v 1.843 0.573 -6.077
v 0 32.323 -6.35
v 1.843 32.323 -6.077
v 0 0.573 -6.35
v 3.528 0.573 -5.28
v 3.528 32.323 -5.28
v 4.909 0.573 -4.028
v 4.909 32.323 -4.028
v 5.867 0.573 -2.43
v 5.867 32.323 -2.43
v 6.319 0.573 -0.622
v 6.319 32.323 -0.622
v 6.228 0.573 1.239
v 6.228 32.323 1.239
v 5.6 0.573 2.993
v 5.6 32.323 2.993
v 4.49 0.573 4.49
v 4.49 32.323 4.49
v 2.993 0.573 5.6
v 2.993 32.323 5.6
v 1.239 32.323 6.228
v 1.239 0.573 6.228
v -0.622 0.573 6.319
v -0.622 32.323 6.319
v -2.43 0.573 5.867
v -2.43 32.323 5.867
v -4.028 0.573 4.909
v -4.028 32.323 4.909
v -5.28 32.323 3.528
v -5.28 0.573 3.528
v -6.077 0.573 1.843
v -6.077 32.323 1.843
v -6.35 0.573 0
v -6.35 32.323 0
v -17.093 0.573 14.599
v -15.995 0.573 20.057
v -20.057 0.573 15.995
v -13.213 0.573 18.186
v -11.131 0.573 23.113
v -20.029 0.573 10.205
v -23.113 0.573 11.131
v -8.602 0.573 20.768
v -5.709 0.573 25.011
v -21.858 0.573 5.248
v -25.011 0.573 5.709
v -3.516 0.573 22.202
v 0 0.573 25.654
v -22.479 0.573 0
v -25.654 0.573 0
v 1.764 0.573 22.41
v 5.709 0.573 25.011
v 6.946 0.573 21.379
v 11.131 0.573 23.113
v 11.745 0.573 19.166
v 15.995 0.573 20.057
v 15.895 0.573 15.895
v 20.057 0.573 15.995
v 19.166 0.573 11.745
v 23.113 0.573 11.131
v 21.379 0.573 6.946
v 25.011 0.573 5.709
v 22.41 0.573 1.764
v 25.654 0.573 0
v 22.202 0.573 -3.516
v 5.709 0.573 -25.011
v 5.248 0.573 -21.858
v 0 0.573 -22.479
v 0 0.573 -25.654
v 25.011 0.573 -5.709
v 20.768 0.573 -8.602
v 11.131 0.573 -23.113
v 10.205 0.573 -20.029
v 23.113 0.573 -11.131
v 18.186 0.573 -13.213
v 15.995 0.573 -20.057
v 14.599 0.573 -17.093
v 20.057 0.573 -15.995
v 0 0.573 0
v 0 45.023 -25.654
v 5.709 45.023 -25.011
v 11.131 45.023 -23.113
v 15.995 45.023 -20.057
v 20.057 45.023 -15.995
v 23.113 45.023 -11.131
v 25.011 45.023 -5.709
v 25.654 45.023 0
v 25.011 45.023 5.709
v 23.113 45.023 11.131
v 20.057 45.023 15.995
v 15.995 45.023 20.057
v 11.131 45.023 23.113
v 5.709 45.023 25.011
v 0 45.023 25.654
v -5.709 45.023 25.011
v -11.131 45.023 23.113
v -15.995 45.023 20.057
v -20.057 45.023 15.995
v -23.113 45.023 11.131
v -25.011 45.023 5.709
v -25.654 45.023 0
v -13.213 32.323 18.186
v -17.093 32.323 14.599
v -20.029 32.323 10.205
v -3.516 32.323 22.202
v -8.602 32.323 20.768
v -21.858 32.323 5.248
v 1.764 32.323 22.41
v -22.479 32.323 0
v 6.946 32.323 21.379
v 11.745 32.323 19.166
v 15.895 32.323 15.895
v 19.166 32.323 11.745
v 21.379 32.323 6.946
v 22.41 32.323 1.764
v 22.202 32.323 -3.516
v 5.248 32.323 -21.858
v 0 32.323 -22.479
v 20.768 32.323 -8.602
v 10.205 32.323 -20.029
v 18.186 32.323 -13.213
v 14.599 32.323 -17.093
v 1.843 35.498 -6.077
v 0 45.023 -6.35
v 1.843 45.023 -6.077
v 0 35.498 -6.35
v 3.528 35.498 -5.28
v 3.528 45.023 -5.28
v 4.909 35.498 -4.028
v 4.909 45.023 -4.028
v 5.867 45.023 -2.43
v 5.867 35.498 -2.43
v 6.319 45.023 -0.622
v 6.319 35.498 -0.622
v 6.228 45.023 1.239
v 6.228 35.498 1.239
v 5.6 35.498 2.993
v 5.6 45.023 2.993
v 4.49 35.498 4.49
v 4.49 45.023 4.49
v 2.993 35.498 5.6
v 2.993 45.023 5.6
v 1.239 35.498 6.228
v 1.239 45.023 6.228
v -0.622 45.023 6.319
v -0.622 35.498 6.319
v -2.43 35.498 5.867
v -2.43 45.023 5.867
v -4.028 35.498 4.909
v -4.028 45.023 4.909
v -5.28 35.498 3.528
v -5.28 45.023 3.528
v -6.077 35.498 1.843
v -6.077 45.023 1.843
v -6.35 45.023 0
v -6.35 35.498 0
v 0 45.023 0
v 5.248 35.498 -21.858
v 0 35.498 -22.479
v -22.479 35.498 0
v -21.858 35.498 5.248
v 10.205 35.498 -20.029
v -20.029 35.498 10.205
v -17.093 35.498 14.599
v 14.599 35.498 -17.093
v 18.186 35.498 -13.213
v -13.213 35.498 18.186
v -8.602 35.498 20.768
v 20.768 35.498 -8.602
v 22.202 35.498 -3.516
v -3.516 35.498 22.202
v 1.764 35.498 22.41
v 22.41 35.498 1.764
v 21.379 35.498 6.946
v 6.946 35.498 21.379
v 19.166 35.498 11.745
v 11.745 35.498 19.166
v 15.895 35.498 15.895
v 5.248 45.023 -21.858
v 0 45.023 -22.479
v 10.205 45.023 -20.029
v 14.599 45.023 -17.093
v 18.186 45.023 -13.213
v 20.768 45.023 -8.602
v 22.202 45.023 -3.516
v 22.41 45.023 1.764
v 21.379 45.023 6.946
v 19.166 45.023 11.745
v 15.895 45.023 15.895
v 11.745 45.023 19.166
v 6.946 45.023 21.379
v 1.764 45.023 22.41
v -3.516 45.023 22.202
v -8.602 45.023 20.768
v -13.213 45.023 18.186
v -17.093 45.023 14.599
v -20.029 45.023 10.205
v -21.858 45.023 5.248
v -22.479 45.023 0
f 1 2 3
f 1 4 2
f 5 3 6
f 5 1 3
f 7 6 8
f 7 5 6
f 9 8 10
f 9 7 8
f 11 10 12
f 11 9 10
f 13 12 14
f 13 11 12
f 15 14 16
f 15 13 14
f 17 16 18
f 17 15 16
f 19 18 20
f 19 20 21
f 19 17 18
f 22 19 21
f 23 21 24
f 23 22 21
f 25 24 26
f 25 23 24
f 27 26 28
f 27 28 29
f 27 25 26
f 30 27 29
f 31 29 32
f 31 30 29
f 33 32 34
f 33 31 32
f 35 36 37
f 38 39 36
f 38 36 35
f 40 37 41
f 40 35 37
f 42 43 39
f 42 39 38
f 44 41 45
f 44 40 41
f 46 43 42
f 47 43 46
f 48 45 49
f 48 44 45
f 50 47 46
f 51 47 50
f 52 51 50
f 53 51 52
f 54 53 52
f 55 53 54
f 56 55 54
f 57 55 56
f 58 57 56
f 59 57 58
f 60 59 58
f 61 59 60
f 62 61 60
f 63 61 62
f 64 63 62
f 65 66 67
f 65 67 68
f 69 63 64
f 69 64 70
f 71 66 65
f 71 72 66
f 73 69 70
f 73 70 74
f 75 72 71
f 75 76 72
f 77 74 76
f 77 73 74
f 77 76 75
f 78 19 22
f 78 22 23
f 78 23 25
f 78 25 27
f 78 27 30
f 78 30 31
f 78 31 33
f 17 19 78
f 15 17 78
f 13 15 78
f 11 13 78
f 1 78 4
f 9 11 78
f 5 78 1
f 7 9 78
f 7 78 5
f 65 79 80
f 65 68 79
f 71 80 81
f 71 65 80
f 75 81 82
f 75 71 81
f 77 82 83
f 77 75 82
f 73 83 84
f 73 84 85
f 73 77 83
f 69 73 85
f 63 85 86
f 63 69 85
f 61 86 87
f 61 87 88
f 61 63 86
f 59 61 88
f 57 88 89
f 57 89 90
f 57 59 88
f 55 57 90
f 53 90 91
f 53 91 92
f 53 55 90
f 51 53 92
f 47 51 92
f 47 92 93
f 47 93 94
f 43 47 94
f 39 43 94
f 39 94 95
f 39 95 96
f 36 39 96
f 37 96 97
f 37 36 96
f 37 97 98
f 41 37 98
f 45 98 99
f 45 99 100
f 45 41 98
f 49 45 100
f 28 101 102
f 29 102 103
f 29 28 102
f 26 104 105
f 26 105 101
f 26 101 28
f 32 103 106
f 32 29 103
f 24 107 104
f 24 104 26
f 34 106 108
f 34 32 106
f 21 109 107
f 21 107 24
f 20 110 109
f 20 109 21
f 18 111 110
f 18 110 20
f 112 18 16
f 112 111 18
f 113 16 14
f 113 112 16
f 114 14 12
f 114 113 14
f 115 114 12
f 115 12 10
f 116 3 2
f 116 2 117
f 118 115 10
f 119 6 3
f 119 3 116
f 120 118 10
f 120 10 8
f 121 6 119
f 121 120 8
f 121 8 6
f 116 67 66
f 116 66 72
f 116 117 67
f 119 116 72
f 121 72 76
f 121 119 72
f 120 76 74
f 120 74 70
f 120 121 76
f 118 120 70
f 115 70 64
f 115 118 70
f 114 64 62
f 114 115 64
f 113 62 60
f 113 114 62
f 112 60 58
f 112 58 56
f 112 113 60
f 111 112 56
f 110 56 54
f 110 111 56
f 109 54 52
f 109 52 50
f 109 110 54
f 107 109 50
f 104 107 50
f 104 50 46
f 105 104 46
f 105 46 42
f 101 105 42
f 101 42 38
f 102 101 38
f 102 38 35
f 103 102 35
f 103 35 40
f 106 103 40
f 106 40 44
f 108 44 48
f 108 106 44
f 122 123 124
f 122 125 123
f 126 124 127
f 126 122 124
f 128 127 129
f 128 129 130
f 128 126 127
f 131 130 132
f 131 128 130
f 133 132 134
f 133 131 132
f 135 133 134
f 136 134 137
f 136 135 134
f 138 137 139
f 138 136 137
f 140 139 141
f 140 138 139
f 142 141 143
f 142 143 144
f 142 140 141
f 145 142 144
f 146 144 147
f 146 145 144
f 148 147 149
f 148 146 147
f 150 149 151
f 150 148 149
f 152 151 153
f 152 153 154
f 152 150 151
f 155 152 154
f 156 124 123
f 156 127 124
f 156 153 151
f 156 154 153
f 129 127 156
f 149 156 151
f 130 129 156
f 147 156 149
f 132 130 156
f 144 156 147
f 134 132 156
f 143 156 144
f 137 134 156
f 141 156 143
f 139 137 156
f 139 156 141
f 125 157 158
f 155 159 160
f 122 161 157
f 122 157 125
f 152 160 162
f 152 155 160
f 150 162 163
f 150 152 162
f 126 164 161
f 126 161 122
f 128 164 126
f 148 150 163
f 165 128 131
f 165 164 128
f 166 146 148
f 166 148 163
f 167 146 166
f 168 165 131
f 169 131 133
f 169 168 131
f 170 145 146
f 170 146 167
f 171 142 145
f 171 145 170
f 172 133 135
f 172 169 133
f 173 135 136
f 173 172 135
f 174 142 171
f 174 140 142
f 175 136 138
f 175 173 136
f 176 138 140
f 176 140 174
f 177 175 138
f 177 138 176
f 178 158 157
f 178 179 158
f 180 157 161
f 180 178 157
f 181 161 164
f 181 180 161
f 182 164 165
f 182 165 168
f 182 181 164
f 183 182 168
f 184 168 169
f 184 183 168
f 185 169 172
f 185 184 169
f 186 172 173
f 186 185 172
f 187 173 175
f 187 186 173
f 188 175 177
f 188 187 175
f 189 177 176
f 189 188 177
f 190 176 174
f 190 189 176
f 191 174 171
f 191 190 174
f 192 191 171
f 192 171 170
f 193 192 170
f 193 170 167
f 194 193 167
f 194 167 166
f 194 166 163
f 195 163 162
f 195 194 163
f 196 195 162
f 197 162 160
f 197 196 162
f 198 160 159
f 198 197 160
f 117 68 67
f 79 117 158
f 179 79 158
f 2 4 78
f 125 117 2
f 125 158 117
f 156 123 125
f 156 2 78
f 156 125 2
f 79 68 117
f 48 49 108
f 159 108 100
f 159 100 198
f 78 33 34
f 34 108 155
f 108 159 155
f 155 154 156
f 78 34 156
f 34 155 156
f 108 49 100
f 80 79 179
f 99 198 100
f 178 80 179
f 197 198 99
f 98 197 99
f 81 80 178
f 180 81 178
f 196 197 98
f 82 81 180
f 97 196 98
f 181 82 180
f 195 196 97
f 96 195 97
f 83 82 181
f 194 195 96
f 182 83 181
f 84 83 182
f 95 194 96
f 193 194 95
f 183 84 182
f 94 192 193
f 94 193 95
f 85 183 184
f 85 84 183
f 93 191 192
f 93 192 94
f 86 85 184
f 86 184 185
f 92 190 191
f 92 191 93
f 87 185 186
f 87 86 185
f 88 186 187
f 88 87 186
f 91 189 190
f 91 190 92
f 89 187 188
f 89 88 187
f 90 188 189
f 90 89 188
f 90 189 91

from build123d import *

# Parameters (mm, degrees)
REVOLVE2_ANGLE      = 270
BOSS_EXTRUDE1_DEPTH = 44.45


with BuildPart() as part:
    # Sketch1 → Revolve2 (revolve)
    with BuildSketch(Plane(origin=(0, 0, 0), x_dir=(0, 0, -1), z_dir=(1, 0, 0))):
        Polygon((22.479, 35.498434974), (22.479, 45.023434974), (25.654, 45.023434974), (25.654, 0.573434974), (22.479, 0.573434974), (22.479, 32.323434974), (6.35, 32.323434974), (6.35, 0.573434974), (3.175, 0.573434974), (3.175, 45.023434974), (6.35, 45.023434974), (6.35, 35.498434974), align=None)
    revolve(axis=Axis((0, 45.023434974, 0), (0, -1, 0)), revolution_arc=REVOLVE2_ANGLE)

    # Sketch2 → Boss-Extrude1 (add, through all)
    with BuildSketch(Plane(origin=(0, 45.023434974, 0), x_dir=(1, 0, 0), z_dir=(0, 1, 0))):
        with BuildLine():
            Line((0, 6.35), (0, 3.175))
            Line((0, 3.175), (0, 0))
            Line((0, 0), (-3.175, 0))
            Line((-3.175, 0), (-6.35, 0))
            ThreePointArc((-6.35, 0), (4.490128061, -4.490128061), (0, 6.35))
        make_face()
    extrude(amount=-BOSS_EXTRUDE1_DEPTH)


solid = part.part
